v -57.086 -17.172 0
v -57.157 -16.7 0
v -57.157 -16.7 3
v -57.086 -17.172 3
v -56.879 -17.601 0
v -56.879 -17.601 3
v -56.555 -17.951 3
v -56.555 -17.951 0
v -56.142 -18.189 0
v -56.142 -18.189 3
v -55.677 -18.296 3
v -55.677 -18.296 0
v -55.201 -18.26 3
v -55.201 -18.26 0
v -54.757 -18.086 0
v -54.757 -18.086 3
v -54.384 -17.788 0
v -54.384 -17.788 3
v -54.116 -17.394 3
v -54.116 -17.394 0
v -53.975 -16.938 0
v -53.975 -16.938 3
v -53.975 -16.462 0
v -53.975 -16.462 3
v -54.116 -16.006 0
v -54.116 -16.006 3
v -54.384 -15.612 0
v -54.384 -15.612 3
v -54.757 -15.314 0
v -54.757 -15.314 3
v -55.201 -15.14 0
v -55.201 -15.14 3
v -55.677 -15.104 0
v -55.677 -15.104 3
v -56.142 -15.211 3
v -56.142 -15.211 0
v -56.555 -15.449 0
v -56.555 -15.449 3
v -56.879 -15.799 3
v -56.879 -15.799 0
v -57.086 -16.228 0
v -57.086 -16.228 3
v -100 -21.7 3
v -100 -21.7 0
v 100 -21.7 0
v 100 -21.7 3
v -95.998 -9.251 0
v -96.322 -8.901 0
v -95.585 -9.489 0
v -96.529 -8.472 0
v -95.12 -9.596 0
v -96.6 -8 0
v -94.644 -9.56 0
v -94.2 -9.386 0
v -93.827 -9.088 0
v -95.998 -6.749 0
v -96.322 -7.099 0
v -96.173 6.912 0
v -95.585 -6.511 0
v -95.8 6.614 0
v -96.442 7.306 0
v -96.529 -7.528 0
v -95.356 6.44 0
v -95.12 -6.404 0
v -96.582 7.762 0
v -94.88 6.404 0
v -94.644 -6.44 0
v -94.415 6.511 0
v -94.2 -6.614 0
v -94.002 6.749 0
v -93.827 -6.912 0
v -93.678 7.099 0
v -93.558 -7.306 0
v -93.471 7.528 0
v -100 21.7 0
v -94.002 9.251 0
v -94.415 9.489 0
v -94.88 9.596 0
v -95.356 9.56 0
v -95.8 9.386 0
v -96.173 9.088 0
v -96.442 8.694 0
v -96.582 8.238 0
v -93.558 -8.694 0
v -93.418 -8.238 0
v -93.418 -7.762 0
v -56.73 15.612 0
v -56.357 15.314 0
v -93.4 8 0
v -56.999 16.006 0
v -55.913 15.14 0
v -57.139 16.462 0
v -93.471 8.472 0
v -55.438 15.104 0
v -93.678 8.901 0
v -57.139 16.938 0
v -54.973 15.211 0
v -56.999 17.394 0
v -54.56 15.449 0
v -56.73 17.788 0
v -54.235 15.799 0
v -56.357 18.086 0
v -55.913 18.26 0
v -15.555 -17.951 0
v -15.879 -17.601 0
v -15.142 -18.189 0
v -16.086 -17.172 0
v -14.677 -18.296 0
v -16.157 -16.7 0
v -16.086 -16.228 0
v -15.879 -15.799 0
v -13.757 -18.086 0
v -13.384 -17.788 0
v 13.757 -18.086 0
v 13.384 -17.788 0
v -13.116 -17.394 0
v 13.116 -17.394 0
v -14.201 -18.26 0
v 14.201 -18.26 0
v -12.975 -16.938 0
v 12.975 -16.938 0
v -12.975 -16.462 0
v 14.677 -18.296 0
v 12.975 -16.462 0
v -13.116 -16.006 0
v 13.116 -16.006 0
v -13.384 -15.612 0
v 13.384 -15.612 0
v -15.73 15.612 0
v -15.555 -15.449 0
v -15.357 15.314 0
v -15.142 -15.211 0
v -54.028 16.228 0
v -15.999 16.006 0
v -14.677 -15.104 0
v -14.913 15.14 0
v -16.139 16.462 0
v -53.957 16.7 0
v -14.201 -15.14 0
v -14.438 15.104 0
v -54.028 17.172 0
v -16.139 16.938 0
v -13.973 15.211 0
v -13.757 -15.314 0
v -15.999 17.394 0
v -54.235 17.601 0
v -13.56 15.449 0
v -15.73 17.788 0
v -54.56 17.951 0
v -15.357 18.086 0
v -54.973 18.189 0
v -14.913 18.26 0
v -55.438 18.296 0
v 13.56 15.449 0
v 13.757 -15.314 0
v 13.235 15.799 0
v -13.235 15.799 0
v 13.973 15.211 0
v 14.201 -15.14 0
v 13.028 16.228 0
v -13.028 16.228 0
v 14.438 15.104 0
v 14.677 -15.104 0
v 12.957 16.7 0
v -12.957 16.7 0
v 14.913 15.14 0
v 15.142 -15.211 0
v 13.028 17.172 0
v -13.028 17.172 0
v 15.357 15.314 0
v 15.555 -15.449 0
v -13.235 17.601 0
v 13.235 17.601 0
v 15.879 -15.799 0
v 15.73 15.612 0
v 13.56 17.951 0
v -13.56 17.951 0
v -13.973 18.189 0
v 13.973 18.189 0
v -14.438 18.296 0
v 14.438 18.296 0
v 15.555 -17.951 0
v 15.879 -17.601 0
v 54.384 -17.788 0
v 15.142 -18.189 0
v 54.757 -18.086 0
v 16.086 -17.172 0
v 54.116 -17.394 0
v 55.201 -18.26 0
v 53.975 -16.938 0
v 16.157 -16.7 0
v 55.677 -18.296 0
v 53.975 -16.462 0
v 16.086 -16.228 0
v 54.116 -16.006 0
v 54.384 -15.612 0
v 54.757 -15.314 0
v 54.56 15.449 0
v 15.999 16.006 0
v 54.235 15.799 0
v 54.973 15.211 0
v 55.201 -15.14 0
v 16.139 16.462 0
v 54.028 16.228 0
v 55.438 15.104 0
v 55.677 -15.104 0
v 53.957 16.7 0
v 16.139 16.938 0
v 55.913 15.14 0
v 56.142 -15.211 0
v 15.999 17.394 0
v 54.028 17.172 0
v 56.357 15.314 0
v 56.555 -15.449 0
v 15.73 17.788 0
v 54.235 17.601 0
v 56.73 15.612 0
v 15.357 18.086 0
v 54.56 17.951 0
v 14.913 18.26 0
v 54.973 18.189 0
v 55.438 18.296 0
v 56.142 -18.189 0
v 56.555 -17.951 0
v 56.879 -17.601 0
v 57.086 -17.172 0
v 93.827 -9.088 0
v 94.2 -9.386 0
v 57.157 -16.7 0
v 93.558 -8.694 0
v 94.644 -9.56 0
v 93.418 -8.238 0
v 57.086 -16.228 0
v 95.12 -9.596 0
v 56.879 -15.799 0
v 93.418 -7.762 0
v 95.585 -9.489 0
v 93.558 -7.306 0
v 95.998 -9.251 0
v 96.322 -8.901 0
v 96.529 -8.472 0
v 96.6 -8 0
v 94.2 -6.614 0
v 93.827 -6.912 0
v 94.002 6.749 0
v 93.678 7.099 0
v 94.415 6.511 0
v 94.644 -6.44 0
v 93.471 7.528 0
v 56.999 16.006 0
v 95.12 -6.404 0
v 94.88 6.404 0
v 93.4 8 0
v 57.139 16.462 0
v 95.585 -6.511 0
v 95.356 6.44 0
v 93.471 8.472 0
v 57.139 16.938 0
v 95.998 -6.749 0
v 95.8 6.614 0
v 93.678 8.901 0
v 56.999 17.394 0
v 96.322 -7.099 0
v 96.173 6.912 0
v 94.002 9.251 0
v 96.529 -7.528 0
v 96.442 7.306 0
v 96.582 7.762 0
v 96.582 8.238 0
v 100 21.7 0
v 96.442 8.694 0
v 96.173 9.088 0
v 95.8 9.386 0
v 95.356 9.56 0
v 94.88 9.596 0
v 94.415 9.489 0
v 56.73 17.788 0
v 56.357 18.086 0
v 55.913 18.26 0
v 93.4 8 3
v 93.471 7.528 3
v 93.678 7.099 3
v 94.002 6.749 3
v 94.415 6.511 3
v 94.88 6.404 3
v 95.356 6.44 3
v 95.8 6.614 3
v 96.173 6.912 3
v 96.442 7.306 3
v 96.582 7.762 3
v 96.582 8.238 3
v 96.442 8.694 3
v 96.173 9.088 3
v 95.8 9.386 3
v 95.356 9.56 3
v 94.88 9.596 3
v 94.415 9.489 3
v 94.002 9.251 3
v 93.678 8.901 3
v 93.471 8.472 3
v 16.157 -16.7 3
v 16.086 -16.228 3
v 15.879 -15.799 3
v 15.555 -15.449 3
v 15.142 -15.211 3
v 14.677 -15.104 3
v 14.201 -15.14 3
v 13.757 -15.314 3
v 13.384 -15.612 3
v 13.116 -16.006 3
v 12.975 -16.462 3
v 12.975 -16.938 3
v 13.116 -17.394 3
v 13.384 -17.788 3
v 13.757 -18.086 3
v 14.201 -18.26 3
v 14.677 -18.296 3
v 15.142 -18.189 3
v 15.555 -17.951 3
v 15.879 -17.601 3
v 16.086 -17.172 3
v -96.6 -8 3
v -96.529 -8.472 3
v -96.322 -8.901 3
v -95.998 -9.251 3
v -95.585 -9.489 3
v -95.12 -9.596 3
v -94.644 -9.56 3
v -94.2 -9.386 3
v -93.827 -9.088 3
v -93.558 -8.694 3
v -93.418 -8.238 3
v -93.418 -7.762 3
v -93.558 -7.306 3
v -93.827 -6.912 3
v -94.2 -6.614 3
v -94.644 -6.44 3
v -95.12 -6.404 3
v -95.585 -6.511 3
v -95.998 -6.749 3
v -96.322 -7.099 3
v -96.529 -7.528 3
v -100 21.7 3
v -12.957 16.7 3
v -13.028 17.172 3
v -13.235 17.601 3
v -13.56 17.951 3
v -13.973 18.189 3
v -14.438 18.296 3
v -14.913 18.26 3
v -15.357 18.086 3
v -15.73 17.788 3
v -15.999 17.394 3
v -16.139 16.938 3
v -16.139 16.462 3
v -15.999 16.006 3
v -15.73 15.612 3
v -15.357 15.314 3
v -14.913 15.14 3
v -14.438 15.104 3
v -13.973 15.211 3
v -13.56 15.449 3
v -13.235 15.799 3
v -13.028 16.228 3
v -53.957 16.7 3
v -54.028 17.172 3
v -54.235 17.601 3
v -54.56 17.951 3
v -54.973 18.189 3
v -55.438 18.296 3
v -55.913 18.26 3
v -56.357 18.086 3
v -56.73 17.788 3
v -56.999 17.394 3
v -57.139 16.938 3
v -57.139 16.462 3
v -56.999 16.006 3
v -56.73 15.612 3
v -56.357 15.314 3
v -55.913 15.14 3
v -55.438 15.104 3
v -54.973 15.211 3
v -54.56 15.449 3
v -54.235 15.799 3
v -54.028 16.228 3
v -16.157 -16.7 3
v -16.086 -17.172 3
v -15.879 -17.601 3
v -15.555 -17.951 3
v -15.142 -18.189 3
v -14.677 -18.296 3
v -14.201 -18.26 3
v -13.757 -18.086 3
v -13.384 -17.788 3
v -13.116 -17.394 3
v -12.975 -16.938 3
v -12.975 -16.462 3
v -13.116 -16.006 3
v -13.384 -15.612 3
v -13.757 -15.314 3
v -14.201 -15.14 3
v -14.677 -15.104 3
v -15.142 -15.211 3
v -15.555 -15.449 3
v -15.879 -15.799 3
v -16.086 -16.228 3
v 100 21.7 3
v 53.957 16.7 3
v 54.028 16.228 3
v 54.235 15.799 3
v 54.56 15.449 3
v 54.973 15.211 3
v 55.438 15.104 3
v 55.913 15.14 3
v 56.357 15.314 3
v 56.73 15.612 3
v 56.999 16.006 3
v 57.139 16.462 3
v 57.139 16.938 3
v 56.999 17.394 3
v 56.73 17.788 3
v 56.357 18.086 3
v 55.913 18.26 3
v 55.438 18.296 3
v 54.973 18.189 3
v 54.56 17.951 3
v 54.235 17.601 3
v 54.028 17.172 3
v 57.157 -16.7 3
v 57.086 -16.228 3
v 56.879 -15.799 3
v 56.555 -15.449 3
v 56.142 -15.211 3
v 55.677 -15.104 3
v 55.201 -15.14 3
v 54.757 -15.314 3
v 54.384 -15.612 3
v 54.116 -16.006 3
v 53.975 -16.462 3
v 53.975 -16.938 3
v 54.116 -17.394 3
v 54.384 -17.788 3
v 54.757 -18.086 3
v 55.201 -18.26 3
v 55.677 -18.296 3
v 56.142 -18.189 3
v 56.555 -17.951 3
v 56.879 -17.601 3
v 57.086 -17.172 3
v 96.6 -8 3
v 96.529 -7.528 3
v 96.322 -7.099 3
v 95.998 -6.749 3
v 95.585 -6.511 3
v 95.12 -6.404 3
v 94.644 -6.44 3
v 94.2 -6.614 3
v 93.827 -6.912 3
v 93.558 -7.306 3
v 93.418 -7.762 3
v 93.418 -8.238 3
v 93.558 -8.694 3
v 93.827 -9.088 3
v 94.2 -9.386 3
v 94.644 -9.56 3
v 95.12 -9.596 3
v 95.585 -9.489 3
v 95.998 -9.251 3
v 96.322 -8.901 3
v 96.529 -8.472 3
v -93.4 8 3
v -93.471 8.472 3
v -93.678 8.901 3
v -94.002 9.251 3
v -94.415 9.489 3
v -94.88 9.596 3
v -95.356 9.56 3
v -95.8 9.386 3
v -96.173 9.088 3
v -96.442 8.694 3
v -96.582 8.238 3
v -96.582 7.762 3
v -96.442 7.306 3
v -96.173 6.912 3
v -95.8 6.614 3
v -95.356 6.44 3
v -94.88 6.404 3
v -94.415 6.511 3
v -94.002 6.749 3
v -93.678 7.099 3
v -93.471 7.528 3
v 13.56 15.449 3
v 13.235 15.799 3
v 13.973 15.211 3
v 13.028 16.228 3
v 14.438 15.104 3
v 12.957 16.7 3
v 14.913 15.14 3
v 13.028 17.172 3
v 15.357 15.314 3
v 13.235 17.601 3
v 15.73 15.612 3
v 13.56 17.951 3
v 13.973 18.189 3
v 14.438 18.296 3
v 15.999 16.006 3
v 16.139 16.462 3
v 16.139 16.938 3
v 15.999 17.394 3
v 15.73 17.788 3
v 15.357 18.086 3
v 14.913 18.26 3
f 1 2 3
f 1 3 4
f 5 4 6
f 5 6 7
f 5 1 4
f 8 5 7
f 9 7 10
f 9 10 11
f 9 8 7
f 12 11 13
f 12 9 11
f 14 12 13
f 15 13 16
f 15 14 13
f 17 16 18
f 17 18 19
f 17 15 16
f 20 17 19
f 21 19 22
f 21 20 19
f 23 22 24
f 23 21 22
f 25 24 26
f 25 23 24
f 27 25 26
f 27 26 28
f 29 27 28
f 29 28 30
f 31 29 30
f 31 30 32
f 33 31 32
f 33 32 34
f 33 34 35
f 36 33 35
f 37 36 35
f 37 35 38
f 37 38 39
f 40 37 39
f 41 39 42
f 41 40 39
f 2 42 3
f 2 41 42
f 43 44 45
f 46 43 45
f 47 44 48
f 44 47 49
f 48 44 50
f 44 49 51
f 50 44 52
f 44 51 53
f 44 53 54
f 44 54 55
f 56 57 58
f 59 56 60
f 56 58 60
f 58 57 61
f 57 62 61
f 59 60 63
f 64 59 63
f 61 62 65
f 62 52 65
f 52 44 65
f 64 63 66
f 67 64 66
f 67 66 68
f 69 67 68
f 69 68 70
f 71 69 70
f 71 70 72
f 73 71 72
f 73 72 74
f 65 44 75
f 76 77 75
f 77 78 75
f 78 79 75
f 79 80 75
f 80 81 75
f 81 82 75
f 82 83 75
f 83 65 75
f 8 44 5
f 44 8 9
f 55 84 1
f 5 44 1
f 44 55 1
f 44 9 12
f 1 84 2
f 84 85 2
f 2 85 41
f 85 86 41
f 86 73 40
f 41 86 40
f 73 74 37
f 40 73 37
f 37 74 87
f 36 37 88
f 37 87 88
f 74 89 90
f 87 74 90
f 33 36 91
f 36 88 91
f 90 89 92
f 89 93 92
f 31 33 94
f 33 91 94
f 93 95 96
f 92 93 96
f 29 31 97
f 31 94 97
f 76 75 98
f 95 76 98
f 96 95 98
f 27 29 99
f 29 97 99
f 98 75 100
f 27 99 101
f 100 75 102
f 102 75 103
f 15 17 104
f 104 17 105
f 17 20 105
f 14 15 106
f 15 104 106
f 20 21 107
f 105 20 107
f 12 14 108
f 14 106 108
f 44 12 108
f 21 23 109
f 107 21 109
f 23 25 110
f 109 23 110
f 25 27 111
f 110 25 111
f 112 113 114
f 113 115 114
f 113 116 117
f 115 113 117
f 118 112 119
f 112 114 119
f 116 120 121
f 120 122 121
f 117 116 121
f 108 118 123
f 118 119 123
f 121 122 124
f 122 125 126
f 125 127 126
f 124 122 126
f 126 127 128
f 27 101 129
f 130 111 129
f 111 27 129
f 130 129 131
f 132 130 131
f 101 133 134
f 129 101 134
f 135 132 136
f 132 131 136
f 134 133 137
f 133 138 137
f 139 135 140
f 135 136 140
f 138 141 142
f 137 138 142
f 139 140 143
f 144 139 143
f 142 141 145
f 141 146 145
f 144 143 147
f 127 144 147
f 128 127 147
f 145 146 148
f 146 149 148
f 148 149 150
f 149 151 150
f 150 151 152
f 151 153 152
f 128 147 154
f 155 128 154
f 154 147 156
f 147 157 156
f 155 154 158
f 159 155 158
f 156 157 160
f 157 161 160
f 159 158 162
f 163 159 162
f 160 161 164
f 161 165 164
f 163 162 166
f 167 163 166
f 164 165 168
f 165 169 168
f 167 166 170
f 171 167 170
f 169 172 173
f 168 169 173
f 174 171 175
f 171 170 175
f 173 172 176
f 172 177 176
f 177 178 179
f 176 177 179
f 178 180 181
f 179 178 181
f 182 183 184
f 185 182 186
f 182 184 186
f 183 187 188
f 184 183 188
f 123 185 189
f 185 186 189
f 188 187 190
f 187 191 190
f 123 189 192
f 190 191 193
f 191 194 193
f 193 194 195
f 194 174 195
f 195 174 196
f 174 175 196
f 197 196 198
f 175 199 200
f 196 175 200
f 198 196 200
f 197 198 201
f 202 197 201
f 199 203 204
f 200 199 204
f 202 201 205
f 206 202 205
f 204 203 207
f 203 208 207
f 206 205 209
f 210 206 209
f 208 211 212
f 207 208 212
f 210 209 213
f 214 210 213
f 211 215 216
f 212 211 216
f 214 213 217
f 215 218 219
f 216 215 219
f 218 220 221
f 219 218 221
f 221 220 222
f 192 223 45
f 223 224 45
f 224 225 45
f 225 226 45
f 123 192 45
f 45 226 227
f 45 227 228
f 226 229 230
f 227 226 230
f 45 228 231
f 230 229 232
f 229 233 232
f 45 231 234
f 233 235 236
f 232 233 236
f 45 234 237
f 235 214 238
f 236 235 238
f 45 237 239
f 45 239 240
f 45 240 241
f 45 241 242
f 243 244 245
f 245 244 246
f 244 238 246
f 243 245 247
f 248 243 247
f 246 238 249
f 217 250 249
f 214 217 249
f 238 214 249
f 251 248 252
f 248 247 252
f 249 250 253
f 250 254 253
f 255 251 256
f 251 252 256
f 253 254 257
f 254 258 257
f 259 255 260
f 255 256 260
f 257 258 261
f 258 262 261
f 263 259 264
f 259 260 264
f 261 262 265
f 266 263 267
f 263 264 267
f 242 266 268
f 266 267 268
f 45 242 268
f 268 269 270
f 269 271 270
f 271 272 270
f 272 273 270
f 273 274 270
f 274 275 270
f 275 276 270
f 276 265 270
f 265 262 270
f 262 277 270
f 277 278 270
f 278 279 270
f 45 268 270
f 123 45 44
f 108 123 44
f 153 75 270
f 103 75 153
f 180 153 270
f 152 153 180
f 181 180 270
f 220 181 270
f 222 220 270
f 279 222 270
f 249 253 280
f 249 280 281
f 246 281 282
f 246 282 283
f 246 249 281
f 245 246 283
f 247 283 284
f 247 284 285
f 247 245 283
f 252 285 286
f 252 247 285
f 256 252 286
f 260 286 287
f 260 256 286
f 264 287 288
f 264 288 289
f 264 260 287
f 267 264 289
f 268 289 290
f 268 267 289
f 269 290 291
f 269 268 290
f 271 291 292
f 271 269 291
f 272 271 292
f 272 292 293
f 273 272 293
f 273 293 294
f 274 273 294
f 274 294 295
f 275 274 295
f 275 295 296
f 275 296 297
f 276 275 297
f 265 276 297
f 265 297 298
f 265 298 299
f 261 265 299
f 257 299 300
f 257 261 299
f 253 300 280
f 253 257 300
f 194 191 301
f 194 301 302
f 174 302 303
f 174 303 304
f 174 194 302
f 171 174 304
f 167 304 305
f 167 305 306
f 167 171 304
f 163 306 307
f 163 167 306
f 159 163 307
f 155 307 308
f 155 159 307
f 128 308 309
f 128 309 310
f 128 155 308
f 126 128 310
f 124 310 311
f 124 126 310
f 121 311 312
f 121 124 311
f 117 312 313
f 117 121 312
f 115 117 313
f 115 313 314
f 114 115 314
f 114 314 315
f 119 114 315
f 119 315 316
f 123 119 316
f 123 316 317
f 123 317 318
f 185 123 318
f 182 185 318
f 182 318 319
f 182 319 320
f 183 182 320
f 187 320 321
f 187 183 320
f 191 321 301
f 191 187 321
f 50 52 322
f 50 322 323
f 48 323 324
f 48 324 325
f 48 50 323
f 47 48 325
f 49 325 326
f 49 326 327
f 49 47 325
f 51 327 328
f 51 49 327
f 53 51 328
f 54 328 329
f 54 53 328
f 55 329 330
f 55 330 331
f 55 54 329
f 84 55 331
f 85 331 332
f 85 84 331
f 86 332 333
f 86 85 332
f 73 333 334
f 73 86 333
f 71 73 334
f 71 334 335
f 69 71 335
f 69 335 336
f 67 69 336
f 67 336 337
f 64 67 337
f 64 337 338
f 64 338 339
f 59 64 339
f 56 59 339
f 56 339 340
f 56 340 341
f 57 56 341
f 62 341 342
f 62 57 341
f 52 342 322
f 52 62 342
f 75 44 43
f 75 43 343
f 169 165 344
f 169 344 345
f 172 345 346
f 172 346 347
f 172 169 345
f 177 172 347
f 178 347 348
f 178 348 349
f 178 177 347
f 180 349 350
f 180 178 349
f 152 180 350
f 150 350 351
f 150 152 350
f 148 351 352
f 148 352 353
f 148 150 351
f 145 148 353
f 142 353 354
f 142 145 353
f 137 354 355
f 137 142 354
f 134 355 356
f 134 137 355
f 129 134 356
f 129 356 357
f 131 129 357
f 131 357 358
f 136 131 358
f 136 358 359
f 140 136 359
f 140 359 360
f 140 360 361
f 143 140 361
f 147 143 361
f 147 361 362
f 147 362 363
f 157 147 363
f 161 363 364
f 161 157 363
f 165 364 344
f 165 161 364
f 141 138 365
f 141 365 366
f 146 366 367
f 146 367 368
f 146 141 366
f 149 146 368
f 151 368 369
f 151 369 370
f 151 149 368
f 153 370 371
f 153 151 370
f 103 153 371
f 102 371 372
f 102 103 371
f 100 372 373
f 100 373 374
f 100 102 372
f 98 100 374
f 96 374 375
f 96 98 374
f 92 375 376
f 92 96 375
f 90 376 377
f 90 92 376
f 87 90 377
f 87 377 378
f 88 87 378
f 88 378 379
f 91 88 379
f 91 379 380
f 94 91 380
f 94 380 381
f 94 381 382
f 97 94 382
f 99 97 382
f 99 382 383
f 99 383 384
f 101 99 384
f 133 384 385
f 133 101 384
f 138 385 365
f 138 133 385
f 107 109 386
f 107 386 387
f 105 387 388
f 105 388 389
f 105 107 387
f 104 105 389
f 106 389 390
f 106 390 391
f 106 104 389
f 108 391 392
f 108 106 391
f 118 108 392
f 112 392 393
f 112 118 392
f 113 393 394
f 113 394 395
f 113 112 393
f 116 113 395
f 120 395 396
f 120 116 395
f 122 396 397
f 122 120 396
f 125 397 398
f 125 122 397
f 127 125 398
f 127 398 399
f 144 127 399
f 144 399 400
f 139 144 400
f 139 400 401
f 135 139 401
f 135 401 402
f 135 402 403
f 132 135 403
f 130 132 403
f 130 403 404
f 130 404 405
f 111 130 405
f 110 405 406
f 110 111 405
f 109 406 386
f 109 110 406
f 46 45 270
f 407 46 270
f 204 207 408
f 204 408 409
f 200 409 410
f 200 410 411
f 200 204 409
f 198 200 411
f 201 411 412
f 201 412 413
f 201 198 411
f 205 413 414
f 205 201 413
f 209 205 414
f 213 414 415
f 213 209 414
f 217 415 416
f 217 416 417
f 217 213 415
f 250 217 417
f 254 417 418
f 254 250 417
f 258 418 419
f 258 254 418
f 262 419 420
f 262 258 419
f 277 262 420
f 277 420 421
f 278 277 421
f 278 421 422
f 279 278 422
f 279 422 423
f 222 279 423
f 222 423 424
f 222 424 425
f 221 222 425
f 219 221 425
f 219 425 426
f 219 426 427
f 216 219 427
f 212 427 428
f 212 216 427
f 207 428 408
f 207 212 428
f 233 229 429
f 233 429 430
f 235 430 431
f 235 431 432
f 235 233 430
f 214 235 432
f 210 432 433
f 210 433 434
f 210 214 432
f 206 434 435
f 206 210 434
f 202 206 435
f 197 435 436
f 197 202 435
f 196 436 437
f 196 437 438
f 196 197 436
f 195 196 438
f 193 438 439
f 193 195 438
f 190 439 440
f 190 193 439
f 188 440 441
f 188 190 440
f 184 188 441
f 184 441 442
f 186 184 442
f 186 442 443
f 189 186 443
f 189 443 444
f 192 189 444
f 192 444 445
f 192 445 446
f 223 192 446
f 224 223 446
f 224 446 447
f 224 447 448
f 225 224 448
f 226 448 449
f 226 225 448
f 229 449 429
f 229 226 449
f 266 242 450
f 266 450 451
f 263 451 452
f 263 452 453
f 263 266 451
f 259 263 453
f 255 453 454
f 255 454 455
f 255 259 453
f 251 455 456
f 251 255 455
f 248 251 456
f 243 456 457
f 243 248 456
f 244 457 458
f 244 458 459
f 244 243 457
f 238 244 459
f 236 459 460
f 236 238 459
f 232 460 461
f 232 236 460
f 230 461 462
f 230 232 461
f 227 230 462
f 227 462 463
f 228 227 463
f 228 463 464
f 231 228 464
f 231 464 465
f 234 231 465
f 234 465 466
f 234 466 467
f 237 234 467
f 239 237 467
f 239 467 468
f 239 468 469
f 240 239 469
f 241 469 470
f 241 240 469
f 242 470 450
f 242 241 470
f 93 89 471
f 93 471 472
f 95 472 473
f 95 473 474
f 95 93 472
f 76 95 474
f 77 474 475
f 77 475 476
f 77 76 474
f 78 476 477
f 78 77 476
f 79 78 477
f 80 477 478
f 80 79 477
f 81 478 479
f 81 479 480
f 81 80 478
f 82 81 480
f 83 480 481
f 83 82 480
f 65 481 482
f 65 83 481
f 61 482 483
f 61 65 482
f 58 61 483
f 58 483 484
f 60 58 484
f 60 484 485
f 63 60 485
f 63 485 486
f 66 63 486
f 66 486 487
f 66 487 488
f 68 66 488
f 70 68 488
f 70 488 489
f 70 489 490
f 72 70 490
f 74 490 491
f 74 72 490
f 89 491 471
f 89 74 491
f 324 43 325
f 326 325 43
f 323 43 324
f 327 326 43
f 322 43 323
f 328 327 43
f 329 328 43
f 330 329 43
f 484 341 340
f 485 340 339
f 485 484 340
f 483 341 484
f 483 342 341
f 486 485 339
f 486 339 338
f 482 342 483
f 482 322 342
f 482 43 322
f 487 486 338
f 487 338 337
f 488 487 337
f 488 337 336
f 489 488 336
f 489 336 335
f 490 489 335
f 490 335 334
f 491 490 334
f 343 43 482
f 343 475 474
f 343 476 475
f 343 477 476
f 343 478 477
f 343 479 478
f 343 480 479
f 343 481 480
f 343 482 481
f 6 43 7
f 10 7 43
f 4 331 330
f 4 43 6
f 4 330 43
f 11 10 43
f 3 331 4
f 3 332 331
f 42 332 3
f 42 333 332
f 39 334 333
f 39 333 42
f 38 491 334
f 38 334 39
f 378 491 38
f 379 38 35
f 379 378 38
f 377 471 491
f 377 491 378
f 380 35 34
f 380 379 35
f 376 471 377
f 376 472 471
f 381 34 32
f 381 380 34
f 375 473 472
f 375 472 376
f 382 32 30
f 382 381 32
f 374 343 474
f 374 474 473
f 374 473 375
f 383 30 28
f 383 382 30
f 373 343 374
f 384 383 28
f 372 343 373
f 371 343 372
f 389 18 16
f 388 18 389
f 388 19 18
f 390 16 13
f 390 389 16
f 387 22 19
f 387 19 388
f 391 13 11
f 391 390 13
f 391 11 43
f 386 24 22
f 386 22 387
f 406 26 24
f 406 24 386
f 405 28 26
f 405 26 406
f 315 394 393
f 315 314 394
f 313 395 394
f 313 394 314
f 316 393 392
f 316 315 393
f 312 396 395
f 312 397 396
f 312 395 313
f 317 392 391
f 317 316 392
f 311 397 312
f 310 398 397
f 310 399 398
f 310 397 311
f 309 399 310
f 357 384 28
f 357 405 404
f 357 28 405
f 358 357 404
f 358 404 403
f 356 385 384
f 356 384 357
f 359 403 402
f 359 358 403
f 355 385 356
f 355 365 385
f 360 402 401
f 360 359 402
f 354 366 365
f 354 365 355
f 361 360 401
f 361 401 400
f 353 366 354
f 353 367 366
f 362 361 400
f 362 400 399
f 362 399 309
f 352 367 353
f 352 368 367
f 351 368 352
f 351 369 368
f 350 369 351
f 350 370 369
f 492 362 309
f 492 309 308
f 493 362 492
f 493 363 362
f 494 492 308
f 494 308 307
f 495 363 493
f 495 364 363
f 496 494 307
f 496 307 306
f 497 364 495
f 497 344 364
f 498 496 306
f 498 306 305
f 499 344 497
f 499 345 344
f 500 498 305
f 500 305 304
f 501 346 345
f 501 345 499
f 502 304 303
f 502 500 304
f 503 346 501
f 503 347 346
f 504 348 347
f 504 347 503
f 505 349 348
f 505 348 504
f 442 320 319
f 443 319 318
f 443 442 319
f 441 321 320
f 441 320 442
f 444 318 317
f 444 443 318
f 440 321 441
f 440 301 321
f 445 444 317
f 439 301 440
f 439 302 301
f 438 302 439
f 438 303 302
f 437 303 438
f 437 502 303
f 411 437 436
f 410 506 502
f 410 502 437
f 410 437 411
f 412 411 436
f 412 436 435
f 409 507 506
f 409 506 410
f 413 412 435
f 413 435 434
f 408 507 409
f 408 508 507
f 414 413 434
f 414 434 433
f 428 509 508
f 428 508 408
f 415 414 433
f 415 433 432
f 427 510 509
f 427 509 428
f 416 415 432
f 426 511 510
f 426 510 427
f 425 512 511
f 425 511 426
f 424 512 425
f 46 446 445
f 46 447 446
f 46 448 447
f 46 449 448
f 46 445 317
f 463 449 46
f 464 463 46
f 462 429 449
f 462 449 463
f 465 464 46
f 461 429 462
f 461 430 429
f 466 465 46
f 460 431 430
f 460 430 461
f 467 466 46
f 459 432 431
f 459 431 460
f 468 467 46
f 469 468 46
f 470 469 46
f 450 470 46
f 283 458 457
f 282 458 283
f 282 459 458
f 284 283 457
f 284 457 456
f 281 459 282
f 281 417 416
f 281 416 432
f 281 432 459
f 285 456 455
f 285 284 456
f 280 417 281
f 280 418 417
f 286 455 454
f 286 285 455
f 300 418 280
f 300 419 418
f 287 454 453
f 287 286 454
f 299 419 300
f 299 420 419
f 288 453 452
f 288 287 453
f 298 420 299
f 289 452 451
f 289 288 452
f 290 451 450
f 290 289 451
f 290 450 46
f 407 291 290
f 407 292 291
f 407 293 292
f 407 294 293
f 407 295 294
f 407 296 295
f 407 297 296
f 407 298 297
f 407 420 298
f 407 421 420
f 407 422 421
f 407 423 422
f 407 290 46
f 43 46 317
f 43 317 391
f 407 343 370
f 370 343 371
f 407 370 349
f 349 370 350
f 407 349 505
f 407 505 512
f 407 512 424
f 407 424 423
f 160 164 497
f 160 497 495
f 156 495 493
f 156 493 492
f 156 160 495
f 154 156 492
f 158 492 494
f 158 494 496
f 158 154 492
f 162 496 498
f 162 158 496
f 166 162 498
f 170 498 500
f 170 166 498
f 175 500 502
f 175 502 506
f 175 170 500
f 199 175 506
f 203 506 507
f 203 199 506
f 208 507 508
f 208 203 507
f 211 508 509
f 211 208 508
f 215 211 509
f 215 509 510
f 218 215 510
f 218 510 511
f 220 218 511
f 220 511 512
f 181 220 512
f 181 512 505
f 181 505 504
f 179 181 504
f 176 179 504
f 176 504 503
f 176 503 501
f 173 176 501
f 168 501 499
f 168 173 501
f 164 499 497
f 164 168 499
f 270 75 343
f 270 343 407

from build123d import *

# Parameters (mm, degrees)
SKETCH_1_W      = 200
SKETCH_1_H      = 43.4
SKETCH_1_R      = 1.6
EXTRUDE_1_DEPTH = 3


with BuildPart() as part:
    # ｽｹｯﾁ1 → ﾎﾞｽ - 押し出し1 (new body)
    with BuildSketch(Plane.XY):
        Rectangle(SKETCH_1_W, SKETCH_1_H)
        with Locations((-14.557299255, 16.7)):
            Circle(SKETCH_1_R, mode=Mode.SUBTRACT)
        with Locations((-55.557299255, 16.7)):
            Circle(SKETCH_1_R, mode=Mode.SUBTRACT)
        with Locations(Location((14.557299255, 16.7, 0), (0, 0, 180))):
            Circle(SKETCH_1_R, mode=Mode.SUBTRACT)
        with Locations(Location((55.557299255, 16.7, 0), (0, 0, 180))):
            Circle(SKETCH_1_R, mode=Mode.SUBTRACT)
        with Locations((55.557299255, -16.7)):
            Circle(SKETCH_1_R, mode=Mode.SUBTRACT)
        with Locations((14.557299255, -16.7)):
            Circle(SKETCH_1_R, mode=Mode.SUBTRACT)
        with Locations(Location((-55.557299255, -16.7, 0), (0, 0, 180))):
            Circle(SKETCH_1_R, mode=Mode.SUBTRACT)
        with Locations(Location((-14.557299255, -16.7, 0), (0, 0, 180))):
            Circle(SKETCH_1_R, mode=Mode.SUBTRACT)
        with Locations((-95, 8)):
            Circle(SKETCH_1_R, mode=Mode.SUBTRACT)
        with Locations(Location((-95, -8, 0), (0, 0, 180))):
            Circle(SKETCH_1_R, mode=Mode.SUBTRACT)
        with Locations((95, -8)):
            Circle(SKETCH_1_R, mode=Mode.SUBTRACT)
        with Locations(Location((95, 8, 0), (0, 0, 180))):
            Circle(SKETCH_1_R, mode=Mode.SUBTRACT)
    extrude(amount=EXTRUDE_1_DEPTH)


solid = part.part
